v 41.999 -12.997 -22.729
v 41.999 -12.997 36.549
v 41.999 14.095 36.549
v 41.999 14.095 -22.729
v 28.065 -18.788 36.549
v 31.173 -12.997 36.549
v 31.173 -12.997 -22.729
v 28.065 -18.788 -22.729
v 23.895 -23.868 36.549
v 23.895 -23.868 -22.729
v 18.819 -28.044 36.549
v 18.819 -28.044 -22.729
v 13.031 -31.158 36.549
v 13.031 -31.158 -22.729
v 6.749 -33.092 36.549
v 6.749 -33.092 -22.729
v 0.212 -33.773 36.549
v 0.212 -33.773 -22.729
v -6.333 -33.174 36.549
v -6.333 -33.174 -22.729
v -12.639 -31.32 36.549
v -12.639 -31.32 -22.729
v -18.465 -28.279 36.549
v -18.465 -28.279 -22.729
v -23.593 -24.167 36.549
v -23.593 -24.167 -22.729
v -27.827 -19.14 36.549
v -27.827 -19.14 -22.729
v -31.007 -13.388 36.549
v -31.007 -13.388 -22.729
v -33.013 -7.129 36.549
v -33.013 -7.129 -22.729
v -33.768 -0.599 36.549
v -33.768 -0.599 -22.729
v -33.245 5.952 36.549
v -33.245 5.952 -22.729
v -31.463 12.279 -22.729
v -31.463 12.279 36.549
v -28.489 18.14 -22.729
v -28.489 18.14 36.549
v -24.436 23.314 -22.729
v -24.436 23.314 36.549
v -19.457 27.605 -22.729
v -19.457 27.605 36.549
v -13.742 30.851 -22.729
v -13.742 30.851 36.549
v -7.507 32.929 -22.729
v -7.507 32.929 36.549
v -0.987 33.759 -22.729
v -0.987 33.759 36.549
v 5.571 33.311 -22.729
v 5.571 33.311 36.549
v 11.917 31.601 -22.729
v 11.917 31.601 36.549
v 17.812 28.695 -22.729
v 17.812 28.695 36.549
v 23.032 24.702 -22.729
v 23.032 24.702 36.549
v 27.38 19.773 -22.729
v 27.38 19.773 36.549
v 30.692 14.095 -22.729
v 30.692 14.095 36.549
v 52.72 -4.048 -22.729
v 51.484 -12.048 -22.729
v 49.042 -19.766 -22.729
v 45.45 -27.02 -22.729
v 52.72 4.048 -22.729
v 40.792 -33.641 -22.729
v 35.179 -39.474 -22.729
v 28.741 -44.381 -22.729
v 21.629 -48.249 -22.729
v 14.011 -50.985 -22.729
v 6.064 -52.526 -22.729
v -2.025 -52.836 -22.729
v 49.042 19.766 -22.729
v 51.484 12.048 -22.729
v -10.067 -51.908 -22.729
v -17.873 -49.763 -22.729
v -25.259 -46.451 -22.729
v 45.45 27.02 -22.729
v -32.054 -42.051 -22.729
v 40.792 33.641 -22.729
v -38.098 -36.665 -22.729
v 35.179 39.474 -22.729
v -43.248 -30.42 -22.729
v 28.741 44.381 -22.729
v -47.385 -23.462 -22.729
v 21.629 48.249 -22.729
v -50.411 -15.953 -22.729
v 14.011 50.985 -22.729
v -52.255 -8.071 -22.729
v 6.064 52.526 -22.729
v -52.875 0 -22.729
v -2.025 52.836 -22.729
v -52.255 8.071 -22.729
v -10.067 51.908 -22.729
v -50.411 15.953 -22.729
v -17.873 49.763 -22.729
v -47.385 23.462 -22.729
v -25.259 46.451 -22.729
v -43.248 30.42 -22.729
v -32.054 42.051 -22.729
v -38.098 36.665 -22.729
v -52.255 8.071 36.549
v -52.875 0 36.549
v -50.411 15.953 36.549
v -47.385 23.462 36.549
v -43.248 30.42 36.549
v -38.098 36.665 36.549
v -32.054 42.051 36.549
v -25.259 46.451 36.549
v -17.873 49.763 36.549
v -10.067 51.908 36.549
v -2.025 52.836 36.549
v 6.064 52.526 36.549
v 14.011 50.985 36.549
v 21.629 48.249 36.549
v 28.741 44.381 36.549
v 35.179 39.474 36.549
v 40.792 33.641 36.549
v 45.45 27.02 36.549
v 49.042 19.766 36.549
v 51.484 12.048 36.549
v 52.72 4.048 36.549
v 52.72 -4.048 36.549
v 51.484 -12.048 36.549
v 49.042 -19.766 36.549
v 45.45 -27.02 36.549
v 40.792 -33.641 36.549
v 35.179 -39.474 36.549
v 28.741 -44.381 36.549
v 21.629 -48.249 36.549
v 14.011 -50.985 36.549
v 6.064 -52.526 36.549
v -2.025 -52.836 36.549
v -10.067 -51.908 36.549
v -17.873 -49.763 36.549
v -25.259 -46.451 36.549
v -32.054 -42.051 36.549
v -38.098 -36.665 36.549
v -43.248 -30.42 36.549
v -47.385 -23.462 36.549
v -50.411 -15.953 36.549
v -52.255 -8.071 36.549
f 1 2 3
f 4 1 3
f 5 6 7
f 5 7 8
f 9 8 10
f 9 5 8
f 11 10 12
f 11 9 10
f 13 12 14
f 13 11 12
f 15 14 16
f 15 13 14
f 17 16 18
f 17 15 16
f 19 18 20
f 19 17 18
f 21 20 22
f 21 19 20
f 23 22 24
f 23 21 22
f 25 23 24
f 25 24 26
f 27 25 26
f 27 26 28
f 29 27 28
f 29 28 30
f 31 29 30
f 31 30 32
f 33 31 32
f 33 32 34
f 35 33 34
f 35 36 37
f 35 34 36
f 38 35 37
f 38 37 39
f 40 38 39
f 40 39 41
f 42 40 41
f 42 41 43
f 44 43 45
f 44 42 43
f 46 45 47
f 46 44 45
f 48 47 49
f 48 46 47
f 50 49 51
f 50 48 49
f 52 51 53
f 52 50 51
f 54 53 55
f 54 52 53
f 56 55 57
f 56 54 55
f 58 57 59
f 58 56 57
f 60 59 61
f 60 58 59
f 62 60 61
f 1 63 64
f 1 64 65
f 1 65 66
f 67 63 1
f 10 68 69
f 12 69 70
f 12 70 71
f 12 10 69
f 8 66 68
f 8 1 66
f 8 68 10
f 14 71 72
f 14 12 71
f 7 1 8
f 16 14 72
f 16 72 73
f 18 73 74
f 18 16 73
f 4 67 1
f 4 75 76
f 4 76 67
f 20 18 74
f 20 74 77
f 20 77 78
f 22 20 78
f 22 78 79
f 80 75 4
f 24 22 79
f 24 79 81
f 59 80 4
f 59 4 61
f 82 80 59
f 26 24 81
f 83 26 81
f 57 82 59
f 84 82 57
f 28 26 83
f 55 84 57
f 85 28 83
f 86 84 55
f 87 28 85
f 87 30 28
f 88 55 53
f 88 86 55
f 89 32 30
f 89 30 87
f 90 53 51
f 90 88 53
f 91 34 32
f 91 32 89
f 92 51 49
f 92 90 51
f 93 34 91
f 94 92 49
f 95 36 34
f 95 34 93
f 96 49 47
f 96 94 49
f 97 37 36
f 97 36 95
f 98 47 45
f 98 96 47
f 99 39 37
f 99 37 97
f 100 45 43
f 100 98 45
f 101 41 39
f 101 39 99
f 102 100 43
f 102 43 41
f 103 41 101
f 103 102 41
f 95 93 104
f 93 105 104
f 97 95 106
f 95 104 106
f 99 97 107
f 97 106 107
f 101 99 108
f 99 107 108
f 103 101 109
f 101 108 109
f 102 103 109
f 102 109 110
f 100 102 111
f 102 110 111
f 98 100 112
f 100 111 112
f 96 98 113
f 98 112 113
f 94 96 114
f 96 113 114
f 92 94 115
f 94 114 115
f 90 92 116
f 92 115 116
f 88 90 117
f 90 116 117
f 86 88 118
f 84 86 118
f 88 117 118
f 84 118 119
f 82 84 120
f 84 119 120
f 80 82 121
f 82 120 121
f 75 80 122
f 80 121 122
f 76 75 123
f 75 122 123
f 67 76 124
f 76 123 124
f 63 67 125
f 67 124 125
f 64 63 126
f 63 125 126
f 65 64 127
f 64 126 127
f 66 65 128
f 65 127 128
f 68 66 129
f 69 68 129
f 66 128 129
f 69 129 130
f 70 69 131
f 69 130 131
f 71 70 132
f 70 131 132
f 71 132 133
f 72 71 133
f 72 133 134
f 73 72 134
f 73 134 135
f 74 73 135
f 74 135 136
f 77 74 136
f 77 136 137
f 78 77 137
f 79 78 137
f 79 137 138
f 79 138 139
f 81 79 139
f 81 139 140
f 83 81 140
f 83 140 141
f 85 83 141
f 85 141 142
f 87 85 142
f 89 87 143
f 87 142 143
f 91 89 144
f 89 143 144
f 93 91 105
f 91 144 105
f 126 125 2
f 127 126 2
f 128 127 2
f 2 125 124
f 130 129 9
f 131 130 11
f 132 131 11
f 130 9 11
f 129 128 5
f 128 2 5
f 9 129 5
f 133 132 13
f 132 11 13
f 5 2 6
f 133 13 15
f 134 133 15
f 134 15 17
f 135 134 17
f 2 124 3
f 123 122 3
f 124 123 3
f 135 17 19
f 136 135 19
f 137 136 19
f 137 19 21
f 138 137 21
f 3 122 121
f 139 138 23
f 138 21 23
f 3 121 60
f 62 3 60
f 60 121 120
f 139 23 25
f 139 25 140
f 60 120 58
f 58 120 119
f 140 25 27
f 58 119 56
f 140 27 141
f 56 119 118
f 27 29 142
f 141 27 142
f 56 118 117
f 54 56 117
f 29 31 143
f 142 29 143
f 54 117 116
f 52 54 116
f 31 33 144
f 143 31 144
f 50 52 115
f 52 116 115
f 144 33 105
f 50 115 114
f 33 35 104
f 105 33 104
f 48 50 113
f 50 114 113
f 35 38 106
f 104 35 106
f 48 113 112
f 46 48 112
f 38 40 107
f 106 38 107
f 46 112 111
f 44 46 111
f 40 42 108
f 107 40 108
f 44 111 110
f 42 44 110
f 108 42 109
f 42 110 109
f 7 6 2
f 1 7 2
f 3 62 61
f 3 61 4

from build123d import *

# Parameters (mm, degrees)
F1_W     = 19.101374
F1_H     = 59.278082
F3_W     = 29.123306
F3_H     = 27.092062
F4_DEPTH = 76.2
F5_R     = 12.7
F6_DEPTH = 12.7


with BuildPart() as f2:
    # F1 (on Front) → F2 (revolve)
    with BuildSketch(Plane.XZ):
        with Locations((-43.324234, 6.909995)):
            Rectangle(F1_W, F1_H)
    revolve(axis=Axis((0, 0, -2.969272), (0, 0, -1)))

    # F3 (on face) → F4 (cut)
    with BuildSketch(Plane.XY.offset(36.549036)):
        with Locations((27.437061, 0.549149)):
            Rectangle(F3_W, F3_H)
    extrude(amount=-F4_DEPTH, mode=Mode.SUBTRACT)

    # F5 (on Front) → F6 (cut, symmetric)
    with BuildSketch(Plane.XZ):
        Circle(F5_R)
    extrude(amount=F6_DEPTH, both=True, mode=Mode.SUBTRACT)


solid = f2.part
